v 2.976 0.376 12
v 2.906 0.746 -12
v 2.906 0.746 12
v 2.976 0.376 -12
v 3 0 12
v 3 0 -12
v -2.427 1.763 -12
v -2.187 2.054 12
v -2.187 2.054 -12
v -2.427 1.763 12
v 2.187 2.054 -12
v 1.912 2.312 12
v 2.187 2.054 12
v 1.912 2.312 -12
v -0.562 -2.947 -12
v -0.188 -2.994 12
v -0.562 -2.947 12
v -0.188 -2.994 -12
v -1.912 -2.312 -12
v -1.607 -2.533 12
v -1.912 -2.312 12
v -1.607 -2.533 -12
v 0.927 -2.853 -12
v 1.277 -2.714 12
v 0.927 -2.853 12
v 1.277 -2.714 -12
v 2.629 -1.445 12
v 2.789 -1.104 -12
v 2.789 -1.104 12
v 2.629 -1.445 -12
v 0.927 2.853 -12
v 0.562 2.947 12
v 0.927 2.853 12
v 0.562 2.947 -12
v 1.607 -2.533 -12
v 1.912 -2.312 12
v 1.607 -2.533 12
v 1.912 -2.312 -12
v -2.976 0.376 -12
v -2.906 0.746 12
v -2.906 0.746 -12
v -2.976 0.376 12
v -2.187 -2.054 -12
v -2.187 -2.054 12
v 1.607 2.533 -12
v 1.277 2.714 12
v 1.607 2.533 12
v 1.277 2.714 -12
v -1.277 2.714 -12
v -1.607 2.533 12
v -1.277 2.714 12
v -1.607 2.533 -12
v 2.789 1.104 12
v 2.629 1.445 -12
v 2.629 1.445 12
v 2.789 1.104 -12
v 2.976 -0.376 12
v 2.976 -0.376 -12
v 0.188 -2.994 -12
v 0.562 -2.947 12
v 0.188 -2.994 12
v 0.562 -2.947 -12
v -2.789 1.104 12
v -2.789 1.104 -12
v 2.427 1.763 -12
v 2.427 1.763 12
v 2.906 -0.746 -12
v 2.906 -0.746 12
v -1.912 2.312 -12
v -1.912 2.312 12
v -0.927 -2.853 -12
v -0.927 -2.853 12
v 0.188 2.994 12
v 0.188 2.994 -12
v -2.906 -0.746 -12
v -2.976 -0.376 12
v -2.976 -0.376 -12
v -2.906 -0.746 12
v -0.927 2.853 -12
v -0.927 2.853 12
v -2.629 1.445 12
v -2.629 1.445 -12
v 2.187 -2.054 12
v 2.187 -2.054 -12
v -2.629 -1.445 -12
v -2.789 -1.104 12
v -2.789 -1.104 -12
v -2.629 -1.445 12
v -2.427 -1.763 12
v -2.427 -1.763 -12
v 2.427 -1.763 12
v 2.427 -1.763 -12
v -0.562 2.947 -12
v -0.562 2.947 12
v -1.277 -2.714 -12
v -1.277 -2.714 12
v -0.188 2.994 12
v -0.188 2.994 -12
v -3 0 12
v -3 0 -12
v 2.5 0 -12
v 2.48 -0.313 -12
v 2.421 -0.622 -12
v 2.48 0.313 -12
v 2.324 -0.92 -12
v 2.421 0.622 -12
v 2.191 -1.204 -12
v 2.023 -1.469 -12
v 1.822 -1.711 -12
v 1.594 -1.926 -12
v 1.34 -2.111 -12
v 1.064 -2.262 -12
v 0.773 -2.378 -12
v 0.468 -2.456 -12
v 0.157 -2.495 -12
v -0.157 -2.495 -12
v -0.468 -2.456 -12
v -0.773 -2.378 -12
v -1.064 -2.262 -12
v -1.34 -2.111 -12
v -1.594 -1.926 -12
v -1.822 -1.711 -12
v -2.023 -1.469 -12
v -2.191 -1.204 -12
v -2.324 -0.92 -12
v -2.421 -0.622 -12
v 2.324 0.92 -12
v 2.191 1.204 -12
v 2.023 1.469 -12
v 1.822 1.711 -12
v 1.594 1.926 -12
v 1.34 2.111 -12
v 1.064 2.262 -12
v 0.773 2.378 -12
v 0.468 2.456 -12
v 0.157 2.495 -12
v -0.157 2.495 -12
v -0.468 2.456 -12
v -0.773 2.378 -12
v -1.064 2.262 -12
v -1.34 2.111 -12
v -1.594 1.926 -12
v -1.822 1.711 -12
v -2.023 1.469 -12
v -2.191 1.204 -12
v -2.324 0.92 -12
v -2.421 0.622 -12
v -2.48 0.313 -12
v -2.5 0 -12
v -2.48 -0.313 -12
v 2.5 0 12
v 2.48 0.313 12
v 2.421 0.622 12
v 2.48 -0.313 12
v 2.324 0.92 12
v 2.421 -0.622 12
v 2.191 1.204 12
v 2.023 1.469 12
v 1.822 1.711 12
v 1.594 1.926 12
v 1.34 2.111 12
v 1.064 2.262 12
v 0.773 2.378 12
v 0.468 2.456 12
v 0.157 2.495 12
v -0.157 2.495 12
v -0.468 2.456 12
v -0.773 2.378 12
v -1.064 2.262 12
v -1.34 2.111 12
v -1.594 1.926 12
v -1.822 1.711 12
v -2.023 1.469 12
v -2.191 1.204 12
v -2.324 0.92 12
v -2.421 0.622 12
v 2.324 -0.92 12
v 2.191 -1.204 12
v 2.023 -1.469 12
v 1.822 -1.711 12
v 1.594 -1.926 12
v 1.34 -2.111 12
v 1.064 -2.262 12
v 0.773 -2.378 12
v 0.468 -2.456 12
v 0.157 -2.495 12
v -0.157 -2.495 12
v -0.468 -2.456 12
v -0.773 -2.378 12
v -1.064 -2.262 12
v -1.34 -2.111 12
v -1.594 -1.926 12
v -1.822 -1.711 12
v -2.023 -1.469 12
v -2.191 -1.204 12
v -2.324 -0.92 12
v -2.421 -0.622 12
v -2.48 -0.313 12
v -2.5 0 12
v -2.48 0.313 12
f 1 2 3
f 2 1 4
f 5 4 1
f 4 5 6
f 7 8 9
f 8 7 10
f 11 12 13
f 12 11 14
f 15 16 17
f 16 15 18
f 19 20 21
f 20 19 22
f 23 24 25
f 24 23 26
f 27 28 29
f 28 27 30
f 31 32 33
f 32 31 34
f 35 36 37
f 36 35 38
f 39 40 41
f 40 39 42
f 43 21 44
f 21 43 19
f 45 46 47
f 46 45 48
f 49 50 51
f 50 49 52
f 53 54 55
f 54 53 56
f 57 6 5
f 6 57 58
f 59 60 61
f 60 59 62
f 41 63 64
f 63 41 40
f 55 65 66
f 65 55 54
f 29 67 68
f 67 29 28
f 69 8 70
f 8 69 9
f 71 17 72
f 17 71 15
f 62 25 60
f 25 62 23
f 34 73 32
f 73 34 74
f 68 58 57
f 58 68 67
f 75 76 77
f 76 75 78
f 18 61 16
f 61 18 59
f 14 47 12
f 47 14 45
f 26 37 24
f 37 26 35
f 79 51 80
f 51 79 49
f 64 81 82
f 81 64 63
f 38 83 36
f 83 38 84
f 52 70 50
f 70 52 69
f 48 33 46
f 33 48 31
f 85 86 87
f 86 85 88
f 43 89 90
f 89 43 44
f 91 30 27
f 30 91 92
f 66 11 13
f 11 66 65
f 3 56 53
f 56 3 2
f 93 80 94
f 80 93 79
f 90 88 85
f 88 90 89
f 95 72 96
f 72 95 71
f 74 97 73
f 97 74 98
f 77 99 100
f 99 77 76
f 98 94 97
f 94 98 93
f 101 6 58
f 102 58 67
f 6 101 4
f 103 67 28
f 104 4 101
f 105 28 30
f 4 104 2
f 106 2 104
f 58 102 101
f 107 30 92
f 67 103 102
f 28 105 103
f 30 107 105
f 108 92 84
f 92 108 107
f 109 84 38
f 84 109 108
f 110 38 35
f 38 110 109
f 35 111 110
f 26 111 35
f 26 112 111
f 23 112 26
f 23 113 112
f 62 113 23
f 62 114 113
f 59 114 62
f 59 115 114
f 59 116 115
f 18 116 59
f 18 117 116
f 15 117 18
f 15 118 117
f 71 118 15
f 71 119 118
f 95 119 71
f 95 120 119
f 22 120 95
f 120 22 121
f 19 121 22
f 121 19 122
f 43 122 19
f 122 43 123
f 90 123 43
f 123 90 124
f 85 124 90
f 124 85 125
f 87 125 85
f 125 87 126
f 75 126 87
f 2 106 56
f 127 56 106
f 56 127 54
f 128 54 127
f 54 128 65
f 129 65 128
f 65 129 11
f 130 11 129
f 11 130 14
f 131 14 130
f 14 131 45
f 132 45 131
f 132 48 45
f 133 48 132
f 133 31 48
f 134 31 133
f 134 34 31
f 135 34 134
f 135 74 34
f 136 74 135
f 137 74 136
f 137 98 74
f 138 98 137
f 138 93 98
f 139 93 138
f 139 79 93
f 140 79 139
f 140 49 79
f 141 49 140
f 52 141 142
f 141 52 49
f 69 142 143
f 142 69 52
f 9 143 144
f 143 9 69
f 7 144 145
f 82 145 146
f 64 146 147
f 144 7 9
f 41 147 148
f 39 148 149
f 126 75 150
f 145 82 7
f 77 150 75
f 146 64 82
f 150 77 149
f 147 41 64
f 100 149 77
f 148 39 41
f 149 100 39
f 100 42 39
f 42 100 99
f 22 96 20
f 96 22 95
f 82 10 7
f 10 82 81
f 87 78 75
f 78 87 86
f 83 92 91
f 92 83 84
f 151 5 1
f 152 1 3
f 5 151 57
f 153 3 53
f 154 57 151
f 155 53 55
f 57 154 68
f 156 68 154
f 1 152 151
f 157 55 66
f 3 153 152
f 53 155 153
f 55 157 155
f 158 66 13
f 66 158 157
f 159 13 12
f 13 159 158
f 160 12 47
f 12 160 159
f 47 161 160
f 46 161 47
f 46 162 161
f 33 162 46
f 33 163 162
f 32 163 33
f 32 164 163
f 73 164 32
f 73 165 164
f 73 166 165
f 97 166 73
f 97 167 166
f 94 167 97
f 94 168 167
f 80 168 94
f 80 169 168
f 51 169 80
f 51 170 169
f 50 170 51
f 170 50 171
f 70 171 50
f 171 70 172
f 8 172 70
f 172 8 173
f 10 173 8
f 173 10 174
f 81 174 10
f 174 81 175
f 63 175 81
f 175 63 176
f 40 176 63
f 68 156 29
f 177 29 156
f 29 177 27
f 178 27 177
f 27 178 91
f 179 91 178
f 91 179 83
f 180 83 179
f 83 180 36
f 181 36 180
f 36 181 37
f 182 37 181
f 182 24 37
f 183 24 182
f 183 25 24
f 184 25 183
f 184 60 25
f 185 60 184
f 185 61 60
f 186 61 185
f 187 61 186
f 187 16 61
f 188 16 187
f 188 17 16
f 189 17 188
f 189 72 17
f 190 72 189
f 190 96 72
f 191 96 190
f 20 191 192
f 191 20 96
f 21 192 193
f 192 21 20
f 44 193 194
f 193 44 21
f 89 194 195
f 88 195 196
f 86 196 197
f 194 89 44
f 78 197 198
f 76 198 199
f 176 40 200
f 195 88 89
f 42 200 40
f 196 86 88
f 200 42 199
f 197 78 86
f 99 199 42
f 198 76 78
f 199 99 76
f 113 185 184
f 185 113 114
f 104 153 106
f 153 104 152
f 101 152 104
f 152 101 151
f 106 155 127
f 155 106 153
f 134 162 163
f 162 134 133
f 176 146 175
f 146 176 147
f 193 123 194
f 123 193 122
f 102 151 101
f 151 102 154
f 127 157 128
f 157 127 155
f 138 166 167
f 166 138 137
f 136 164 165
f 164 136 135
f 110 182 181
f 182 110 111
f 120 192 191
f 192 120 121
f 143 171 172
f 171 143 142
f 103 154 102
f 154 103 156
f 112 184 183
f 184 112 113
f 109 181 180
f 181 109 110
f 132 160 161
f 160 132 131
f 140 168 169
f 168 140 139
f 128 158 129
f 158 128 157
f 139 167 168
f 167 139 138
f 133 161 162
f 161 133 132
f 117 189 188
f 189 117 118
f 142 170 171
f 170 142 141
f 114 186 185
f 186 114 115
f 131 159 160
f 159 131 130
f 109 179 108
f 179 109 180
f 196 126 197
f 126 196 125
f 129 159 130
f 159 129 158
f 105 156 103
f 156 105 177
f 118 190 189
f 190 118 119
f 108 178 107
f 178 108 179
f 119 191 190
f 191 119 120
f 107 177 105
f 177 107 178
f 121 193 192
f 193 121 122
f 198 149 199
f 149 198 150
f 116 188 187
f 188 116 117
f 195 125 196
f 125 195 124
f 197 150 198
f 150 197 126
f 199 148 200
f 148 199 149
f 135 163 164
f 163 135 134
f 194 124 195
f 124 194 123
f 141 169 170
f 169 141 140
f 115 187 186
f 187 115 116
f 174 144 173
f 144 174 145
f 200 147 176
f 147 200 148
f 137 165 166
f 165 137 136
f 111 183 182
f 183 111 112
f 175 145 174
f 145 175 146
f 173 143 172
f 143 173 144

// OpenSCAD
$fn = 50;


difference() {
	union() {
		translate(v = [0, 0, -12.0000000000]) {
			cylinder(h = 24, r = 3.0000000000);
		}
	}
	union() {
		translate(v = [0, 0, -100.0000000000]) {
			cylinder(h = 200, r = 2.5000000000);
		}
	}
}
